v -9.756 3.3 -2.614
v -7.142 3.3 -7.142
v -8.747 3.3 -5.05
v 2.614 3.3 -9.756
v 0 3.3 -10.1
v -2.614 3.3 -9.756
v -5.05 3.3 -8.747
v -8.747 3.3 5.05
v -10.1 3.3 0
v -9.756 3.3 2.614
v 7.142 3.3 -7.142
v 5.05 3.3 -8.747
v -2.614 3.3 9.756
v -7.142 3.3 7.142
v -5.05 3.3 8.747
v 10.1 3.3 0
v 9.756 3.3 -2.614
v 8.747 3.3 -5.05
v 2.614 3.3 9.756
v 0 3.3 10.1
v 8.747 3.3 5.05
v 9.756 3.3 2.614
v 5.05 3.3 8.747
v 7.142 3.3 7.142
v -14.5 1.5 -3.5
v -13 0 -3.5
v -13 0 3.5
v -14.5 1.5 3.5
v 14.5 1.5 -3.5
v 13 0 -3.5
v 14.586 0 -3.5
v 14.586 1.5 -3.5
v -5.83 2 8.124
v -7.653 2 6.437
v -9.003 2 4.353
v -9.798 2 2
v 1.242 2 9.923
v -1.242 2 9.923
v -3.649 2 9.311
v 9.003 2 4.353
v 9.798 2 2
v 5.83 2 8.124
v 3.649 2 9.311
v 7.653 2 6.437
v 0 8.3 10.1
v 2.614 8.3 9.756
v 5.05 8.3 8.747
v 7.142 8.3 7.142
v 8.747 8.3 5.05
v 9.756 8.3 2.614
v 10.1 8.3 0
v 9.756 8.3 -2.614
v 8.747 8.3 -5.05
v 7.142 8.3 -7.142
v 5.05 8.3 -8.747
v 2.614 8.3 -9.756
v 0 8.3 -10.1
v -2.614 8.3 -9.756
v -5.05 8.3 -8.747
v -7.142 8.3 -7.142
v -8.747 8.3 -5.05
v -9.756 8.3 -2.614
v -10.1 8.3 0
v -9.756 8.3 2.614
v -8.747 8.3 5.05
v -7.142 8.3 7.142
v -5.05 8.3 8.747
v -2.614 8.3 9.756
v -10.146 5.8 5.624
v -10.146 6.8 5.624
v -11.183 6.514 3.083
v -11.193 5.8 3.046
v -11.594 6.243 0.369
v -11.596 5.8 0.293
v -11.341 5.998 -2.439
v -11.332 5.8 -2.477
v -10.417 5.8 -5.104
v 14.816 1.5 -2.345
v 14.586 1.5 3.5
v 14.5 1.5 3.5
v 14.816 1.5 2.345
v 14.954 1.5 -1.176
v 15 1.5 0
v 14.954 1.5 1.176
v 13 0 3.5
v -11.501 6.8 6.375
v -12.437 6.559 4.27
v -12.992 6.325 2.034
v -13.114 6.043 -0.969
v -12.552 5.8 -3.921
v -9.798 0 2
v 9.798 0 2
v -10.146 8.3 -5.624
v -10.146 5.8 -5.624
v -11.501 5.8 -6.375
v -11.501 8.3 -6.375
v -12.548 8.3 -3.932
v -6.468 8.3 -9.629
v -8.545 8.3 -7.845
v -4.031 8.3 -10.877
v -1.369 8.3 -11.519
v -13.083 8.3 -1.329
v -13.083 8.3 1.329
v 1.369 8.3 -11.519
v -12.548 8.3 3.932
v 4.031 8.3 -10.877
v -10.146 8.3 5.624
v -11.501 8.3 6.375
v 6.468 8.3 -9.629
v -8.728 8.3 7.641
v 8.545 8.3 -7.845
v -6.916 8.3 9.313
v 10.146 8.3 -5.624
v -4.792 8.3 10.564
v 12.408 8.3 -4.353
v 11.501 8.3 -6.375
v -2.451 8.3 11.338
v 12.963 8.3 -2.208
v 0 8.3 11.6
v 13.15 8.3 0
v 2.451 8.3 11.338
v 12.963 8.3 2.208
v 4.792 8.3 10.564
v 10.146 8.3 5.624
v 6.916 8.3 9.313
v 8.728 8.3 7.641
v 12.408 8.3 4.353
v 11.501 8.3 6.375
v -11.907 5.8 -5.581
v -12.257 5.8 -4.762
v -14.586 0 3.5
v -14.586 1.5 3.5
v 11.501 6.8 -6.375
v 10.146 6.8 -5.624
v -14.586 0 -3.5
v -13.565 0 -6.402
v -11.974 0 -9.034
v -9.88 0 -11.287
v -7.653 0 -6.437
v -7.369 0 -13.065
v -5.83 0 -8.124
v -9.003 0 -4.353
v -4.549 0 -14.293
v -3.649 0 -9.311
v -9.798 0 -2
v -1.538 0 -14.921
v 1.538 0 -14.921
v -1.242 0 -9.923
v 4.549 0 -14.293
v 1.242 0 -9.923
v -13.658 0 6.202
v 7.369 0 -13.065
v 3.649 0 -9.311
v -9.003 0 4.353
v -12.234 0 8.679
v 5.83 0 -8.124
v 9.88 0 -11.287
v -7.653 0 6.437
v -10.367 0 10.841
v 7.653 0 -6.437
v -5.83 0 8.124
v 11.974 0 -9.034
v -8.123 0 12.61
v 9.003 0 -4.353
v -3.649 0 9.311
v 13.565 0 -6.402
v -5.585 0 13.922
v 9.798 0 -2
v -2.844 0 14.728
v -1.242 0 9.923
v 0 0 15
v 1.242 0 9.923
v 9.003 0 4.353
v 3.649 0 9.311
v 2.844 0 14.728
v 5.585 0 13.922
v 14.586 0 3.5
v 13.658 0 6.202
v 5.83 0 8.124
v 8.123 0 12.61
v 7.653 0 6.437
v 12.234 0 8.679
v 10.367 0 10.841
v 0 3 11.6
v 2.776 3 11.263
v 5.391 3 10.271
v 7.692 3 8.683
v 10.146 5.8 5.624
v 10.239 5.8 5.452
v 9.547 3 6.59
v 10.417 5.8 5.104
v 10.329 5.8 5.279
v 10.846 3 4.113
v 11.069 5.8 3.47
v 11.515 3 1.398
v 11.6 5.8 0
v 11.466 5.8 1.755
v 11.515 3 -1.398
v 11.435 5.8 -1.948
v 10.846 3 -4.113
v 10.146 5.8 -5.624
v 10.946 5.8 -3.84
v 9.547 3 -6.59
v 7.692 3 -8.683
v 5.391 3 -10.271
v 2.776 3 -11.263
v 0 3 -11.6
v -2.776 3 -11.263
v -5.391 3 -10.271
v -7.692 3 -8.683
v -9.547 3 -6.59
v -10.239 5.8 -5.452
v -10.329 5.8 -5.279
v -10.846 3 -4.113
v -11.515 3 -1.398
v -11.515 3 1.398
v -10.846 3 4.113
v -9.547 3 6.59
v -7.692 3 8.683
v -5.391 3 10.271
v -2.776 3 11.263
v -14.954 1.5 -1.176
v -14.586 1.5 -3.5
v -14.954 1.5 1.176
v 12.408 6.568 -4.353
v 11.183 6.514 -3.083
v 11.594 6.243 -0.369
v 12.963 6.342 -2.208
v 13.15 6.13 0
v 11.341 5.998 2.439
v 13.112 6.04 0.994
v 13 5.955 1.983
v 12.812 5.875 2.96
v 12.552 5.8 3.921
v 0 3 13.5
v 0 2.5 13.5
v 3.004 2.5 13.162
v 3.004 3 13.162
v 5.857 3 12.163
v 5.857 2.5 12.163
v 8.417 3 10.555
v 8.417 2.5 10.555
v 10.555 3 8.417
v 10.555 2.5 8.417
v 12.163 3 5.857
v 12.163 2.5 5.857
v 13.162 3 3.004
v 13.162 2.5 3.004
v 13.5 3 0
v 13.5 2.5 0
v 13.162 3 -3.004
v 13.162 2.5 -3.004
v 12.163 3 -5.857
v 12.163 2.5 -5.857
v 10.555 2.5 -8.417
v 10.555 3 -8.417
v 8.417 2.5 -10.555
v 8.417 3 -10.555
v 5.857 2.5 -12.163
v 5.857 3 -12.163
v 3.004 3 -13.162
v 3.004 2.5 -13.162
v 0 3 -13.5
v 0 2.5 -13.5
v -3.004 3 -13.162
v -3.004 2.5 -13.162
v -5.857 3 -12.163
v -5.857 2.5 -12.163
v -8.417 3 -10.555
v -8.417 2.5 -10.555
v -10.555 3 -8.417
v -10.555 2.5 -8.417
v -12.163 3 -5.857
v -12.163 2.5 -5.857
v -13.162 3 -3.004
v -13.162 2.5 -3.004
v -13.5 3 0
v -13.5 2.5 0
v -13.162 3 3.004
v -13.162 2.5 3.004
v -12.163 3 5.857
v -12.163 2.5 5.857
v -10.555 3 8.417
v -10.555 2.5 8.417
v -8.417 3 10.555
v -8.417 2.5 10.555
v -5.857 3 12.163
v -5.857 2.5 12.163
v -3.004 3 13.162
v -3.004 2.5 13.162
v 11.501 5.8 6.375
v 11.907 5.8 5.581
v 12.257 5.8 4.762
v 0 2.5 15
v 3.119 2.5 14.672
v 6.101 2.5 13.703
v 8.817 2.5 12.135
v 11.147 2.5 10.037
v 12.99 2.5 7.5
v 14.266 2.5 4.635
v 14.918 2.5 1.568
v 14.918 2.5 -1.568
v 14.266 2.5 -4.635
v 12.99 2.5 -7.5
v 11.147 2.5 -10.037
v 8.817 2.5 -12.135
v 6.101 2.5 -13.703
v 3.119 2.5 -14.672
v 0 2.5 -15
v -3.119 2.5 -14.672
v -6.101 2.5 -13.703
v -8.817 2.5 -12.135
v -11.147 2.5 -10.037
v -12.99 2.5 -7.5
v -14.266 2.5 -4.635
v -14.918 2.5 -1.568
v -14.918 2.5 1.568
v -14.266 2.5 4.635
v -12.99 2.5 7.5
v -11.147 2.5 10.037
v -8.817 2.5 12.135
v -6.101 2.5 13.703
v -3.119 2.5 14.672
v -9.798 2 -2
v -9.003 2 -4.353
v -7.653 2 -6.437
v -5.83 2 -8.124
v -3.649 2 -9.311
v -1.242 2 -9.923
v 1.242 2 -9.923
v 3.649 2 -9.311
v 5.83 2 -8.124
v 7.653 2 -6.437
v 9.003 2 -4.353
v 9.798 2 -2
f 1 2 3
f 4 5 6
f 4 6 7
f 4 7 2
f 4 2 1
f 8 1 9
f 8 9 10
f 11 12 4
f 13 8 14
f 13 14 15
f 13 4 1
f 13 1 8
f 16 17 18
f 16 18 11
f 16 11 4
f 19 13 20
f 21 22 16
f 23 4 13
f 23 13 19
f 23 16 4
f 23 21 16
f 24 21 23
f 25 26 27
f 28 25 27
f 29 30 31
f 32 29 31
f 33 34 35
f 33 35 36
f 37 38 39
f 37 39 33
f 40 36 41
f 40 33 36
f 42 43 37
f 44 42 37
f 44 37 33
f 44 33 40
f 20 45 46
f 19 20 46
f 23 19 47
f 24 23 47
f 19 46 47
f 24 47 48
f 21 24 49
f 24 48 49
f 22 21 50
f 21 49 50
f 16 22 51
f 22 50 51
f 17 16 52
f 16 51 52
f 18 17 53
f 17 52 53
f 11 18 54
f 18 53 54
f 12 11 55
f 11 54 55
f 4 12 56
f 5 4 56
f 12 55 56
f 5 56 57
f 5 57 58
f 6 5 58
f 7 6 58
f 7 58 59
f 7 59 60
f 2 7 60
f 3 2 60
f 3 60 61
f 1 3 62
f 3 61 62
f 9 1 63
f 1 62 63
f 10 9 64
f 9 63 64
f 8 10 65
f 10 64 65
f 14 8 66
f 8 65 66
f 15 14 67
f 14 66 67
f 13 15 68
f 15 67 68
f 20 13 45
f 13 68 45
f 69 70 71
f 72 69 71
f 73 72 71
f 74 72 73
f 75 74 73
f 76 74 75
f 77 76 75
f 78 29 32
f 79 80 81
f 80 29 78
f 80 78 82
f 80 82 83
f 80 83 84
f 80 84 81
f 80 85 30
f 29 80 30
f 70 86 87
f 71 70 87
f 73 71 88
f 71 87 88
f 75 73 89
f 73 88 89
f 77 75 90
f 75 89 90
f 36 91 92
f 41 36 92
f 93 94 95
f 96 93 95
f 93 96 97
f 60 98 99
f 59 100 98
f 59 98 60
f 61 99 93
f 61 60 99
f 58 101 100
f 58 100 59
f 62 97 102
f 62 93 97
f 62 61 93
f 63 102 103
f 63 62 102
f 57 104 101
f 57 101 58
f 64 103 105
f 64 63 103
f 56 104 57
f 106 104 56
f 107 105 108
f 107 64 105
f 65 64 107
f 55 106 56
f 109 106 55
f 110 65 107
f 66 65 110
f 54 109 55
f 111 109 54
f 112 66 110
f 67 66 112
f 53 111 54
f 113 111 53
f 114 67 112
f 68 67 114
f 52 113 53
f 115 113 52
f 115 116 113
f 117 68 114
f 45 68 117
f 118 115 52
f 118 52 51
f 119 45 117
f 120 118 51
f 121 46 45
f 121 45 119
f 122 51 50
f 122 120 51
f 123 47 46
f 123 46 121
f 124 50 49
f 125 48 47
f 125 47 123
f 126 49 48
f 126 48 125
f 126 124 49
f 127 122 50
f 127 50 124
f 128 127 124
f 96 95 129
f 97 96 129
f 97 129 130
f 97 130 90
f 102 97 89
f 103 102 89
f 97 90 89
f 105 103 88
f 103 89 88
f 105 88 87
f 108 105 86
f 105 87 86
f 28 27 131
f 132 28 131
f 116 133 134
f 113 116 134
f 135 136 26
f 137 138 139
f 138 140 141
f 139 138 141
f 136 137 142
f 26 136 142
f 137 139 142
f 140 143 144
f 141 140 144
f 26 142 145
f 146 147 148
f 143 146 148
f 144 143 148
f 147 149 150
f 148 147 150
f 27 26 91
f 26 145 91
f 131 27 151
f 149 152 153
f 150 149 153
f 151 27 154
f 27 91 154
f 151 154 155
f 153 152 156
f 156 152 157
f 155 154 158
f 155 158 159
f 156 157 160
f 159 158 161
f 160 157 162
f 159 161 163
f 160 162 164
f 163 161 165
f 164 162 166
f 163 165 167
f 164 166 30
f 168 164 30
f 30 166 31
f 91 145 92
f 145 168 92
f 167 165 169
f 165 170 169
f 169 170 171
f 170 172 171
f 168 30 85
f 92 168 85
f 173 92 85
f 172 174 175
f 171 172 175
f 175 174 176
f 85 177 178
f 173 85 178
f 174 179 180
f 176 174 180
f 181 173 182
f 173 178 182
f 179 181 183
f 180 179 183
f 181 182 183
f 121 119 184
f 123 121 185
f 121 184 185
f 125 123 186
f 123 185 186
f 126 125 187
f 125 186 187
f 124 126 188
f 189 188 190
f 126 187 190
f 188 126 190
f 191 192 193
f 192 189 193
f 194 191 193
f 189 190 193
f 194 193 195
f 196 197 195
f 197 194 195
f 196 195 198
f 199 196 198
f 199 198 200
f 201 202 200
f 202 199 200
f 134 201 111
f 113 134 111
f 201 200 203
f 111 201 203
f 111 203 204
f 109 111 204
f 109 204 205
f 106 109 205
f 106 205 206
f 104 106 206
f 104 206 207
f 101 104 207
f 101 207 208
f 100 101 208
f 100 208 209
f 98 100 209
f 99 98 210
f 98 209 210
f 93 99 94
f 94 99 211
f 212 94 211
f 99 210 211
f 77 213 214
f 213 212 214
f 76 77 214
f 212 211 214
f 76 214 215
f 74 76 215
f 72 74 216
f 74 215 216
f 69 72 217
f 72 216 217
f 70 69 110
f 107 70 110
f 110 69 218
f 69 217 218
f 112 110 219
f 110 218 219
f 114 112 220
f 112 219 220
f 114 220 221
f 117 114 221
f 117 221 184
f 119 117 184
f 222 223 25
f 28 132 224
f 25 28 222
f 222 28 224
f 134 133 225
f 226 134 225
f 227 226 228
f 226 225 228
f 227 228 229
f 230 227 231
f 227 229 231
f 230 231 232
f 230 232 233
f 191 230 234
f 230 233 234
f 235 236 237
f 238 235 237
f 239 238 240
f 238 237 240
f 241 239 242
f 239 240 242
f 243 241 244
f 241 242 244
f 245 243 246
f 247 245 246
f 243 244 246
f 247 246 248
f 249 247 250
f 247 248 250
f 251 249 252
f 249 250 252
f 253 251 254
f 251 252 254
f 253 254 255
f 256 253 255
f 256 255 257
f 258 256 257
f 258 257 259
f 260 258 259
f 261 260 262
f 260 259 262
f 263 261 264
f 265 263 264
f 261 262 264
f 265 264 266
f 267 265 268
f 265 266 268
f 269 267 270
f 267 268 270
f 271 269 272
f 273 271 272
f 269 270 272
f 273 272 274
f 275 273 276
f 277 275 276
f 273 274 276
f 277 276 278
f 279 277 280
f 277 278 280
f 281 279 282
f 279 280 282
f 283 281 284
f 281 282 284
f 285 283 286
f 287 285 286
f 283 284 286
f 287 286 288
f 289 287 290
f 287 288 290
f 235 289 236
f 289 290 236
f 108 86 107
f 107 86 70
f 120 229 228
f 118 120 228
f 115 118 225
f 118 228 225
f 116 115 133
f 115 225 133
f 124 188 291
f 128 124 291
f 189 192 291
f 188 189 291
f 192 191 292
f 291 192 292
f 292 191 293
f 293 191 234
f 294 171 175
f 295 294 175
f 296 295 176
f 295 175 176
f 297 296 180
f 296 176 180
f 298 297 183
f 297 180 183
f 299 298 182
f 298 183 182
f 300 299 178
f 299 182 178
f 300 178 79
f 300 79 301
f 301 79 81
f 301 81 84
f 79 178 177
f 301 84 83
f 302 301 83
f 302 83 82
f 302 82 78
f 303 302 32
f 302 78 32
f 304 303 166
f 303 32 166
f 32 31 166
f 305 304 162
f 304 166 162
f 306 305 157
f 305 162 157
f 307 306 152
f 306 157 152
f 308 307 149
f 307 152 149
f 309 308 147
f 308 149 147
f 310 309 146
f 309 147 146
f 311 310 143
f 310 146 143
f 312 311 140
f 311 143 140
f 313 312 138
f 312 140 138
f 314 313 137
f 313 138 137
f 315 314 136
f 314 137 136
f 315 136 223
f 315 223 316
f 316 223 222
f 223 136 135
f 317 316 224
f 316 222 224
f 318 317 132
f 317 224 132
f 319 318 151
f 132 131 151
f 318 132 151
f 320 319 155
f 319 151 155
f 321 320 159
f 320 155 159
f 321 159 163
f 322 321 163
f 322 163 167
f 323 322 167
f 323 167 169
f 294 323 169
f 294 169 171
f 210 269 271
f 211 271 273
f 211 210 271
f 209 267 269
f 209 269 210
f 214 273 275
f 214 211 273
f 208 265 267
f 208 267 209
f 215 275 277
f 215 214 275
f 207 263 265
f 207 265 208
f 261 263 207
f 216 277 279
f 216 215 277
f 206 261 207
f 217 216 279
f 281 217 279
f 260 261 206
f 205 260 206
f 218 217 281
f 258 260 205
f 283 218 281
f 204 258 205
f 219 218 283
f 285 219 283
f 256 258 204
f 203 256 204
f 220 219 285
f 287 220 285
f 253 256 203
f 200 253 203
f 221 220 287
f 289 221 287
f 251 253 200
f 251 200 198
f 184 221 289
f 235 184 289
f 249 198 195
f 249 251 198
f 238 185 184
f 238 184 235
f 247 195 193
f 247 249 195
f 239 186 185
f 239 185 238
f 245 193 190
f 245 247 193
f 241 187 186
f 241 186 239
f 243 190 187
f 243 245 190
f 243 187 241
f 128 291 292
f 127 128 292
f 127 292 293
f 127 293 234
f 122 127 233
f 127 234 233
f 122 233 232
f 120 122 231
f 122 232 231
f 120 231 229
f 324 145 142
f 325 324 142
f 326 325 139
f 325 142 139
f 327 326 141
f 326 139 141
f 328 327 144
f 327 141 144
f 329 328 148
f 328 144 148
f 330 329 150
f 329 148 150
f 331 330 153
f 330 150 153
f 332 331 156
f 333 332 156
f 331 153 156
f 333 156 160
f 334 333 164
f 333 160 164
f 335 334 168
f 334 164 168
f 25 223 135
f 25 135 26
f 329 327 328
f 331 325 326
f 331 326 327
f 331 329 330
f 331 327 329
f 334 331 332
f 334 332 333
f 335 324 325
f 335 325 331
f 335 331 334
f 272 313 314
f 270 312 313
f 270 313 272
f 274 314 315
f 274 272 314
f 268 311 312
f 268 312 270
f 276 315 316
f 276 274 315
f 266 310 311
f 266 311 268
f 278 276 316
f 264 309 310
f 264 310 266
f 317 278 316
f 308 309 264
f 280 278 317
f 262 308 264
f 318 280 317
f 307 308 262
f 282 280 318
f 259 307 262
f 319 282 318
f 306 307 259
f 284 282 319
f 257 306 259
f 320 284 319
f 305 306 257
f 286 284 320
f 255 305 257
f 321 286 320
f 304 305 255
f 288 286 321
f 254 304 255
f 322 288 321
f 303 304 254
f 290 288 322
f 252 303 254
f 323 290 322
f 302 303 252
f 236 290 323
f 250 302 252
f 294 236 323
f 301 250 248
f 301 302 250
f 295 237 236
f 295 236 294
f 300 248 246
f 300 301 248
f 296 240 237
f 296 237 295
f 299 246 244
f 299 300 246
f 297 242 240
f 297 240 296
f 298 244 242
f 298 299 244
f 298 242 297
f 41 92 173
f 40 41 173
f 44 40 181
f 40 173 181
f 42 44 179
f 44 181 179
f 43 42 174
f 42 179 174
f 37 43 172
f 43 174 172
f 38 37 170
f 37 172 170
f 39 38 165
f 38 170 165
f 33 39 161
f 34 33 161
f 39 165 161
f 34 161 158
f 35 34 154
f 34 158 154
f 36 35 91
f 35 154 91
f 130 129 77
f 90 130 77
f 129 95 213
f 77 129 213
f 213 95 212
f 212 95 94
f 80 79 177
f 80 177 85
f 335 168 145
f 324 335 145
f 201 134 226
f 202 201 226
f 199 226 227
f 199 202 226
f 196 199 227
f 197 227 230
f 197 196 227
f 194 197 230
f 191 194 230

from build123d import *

# Parameters (mm, degrees)
SKETCH1_R           = 15
BOSS_EXTRUDE1_DEPTH = 2.5
SKETCH2_R           = 13.5
BOSS_EXTRUDE2_DEPTH = 0.5
SKETCH3_R           = 11.6
BOSS_EXTRUDE3_DEPTH = 5.3
SKETCH4_R           = 10.1
CUT_EXTRUDE1_DEPTH  = 5
CUT_EXTRUDE2_DEPTH  = 2
BOSS_EXTRUDE4_START = -2.5
BOSS_EXTRUDE4_DEPTH = 2.5
CUT_EXTRUDE3_DEPTH  = 1.5
CHAMFER1_SIZE       = 1.5
CHAMFER3_SIZE       = 1
CHAMFER3_SIZE_2     = 9.514364454


# Some blends are built 0.0001 mm under size
with BuildPart() as part:
    # Sketch1 → Boss-Extrude1 (new body)
    with BuildSketch(Plane(origin=(0, 0, 0), x_dir=(1, 0, 0), z_dir=(0, 1, 0))):
        with Locations(Location((0, 0, 0), (0, 0, 270))):
            Circle(SKETCH1_R)
    extrude(amount=BOSS_EXTRUDE1_DEPTH)

    # Sketch2 → Boss-Extrude2 (add)
    with BuildSketch(Plane(origin=(0, 2.5, 0), x_dir=(1, 0, 0), z_dir=(0, 1, 0))):
        with Locations(Location((0, 0, 0), (0, 0, 270))):
            Circle(SKETCH2_R)
    extrude(amount=BOSS_EXTRUDE2_DEPTH)

    # Sketch3 → Boss-Extrude3 (add)
    with BuildSketch(Plane(origin=(0, 3, 0), x_dir=(1, 0, 0), z_dir=(0, 1, 0))):
        with Locations(Location((0, 0, 0), (0, 0, 270))):
            Circle(SKETCH3_R)
    extrude(amount=BOSS_EXTRUDE3_DEPTH)

    # Sketch4 → Cut-Extrude1 (cut)
    with BuildSketch(Plane(origin=(0, 8.3, 0), x_dir=(1, 0, 0), z_dir=(0, 1, 0))):
        with Locations(Location((0, 0, 0), (0, 0, 270))):
            Circle(SKETCH4_R)
    extrude(amount=-CUT_EXTRUDE1_DEPTH, mode=Mode.SUBTRACT)

    # Sketch6 → Cut-Extrude2 (cut)
    with BuildSketch(Plane.XZ):
        with BuildLine():
            ThreePointArc((9.797958971, 2), (0, 10), (-9.797958971, 2))
            Line((-9.797958971, 2), (9.797958971, 2))
        make_face()
        with BuildLine():
            Line((9.797958971, -2), (-9.797958971, -2))
            ThreePointArc((-9.797958971, -2), (0, -10), (9.797958971, -2))
        make_face()
    extrude(amount=-CUT_EXTRUDE2_DEPTH, mode=Mode.SUBTRACT)

    # Sketch7 → Boss-Extrude4 (add)
    with BuildSketch(Plane(origin=(0, 8.3, 0), x_dir=(1, 0, 0), z_dir=(0, 1, 0)).offset(BOSS_EXTRUDE4_START)):
        with BuildLine():
            ThreePointArc((11.6, 0), (11.230512628, -2.904408047), (10.145588603, -5.623791595))
            Line((10.145588603, -5.623791595), (11.501249149, -6.375246506))
            ThreePointArc((11.501249149, -6.375246506), (12.731141471, -3.292497053), (13.15, 0))
            ThreePointArc((13.15, 0), (12.731141471, 3.292497053), (11.501249149, 6.375246506))
            Line((11.501249149, 6.375246506), (10.145588603, 5.623791595))
            ThreePointArc((10.145588603, 5.623791595), (11.230512628, 2.904408047), (11.6, 0))
        make_face()
        with BuildLine():
            Line((-11.501249149, -6.375246506), (-10.145588603, -5.623791595))
            ThreePointArc((-10.145588603, -5.623791595), (-11.6, 0), (-10.145588603, 5.623791595))
            Line((-10.145588603, 5.623791595), (-11.501249149, 6.375246506))
            ThreePointArc((-11.501249149, 6.375246506), (-13.15, 0), (-11.501249149, -6.375246506))
        make_face()
    extrude(amount=BOSS_EXTRUDE4_DEPTH)

    # Sketch8 → Cut-Extrude3 (cut)
    with BuildSketch(Plane.XZ):
        with BuildLine():
            Line((13, 3.5), (13, -3.5))
            Line((13, -3.5), (14.585952146, -3.5))
            ThreePointArc((14.585952146, -3.5), (14.896128393, -1.762202856), (15, 0))
            ThreePointArc((15, 0), (14.896128393, 1.762202856), (14.585952146, 3.5))
            Line((14.585952146, 3.5), (13, 3.5))
        make_face()
        with BuildLine():
            ThreePointArc((-14.585952146, 3.5), (-15, 0), (-14.585952146, -3.5))
            Line((-14.585952146, -3.5), (-13, -3.5))
            Line((-13, -3.5), (-13, 3.5))
            Line((-13, 3.5), (-14.585952146, 3.5))
        make_face()
    extrude(amount=-CUT_EXTRUDE3_DEPTH, mode=Mode.SUBTRACT)

    # Chamfer1
    chamfer1_edges = [part.edges().sort_by_distance(p)[0] for p in [
        (13, 1.5, 0),
        (-13, 1.5, 0),
    ]]
    chamfer(chamfer1_edges, length=CHAMFER1_SIZE - 0.0001)  # a hair under: the kernel refuses the full size

    # Chamfer3
    # the kernel refuses this chamfer: 9.514364454, 1 mm, written as the material it takes off along each edge
    with BuildSketch(Plane(origin=(33.132637154, 5.8, -18.365720673), x_dir=(-0.1658303097717397, 0.9396808679591152, -0.29916579809967064), z_dir=(-0.874619707139395, 0, 0.4848096202463386))) as chamfer3_piece_1_section:
        Polygon((CHAMFER3_SIZE * 0.939680867959, -CHAMFER3_SIZE * 0.342052432226), (-CHAMFER3_SIZE_2 * 0.342052432234, -CHAMFER3_SIZE_2 * 0.939680867981), (0, 0), align=None)
    chamfer3_piece_1 = extrude(amount=51.014670938, mode=Mode.PRIVATE)
    chamfer3_piece_1 = chamfer3_piece_1 - Plane(origin=(0, 6.124739453, 0), x_dir=(0, 0, 1), z_dir=(0, -1, 0)) * Cylinder(11.6, 138, mode=Mode.PRIVATE)
    add(chamfer3_piece_1, mode=Mode.SUBTRACT)
    with BuildSketch(Plane(origin=(-33.132637154, 5.8, 18.365720673), x_dir=(0.16583030977173743, 0.9396808679591152, 0.2991657980996716), z_dir=(0.8746197071393984, 0, -0.48480962024633234))) as chamfer3_piece_2_section:
        Polygon((CHAMFER3_SIZE * 0.939680867959, -CHAMFER3_SIZE * 0.342052432226), (-CHAMFER3_SIZE_2 * 0.342052432234, -CHAMFER3_SIZE_2 * 0.939680867981), (0, 0), align=None)
    chamfer3_piece_2 = extrude(amount=51.014670938, mode=Mode.PRIVATE)
    chamfer3_piece_2 = chamfer3_piece_2 - Plane(origin=(0, 6.124739453, 0), x_dir=(0, 0, 1), z_dir=(0, -1, 0)) * Cylinder(11.6, 138, mode=Mode.PRIVATE)
    add(chamfer3_piece_2, mode=Mode.SUBTRACT)


solid = part.part
